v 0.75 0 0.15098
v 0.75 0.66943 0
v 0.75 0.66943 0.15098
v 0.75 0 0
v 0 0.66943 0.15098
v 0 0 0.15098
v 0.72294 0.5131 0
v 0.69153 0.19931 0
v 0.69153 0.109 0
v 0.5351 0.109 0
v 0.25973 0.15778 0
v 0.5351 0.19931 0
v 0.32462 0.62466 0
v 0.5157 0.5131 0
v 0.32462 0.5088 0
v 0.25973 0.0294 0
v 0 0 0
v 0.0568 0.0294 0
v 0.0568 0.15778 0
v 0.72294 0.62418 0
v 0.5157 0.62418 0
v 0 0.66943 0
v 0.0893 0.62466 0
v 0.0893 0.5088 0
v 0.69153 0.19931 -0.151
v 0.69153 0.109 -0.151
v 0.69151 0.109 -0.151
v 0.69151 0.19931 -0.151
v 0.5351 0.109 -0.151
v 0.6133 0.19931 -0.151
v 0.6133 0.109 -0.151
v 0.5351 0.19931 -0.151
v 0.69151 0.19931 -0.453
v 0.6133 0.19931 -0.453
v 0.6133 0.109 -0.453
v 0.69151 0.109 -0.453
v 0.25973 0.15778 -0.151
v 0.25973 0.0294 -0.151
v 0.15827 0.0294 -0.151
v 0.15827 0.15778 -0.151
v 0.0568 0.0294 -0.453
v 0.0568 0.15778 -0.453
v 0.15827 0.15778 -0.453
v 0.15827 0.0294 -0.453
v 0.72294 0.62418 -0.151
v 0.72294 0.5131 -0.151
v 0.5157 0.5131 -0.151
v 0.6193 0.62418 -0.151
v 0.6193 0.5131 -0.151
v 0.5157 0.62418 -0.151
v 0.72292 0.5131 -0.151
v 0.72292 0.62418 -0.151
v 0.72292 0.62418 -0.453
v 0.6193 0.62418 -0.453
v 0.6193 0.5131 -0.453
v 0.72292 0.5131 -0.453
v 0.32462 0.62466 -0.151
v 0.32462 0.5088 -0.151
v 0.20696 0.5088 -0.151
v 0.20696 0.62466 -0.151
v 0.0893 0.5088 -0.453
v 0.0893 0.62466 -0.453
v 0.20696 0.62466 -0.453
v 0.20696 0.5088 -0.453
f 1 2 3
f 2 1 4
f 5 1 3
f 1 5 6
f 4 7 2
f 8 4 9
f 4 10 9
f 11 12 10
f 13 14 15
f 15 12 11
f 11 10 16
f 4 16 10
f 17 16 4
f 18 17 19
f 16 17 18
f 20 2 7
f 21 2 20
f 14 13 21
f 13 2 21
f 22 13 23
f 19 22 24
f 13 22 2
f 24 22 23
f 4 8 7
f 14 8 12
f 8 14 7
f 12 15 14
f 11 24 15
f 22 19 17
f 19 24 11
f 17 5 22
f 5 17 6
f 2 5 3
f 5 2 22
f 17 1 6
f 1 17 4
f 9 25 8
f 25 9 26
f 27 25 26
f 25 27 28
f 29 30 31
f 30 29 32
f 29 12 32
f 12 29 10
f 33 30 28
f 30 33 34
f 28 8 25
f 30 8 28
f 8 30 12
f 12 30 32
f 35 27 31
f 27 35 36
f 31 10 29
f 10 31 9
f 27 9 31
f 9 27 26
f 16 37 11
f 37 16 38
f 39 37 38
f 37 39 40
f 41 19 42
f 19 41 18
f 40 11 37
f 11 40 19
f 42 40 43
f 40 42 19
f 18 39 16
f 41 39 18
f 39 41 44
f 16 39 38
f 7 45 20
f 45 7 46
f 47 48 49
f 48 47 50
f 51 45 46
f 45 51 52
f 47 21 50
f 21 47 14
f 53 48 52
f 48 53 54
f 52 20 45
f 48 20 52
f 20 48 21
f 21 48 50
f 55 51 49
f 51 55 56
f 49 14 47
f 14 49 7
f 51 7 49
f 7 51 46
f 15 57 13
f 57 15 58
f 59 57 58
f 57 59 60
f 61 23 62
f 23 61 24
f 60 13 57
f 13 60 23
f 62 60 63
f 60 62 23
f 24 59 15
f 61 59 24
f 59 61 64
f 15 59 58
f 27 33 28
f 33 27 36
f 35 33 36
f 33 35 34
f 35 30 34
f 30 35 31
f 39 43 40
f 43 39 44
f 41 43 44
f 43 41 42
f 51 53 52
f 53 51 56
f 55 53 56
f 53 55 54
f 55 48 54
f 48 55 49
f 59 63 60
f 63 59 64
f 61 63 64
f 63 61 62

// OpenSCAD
// Base dimensions
length = 0.75;
width = 0.669426;
height = 0.150979;

// Pad depths
pad_depth = 0.151;
continuation_depth = 0.302;

// Pad 1 (shallow)
pad1_w = 0.156427;
pad1_d = 0.090313;
pad1_left = 0.5351;
pad1_right = 0.0585;
pad1_front = 0.109;
pad1_back = 0.4701;

// Pad 2 (shallow)
pad2_w = 0.202932;
pad2_d = 0.128382;
pad2_left = 0.0568;
pad2_right = 0.4903;
pad2_front = 0.0294;
pad2_back = 0.5116;

// Pad 3 (shallow)
pad3_w = 0.207237;
pad3_d = 0.111076;
pad3_left = 0.5157;
pad3_right = 0.0271;
pad3_front = 0.5131;
pad3_back = 0.0452;

// Pad 4 (shallow)
pad4_w = 0.235324;
pad4_d = 0.115862;
pad4_left = 0.0893;
pad4_right = 0.4254;
pad4_front = 0.5088;
pad4_back = 0.0447;

// Continuation dimensions and offsets (sharing edges with shallow pads)
cont1_w = 0.078214;
cont1_d = 0.090313;
cont1_left = 0.6133;
cont1_right = 0.0585;
cont1_front = 0.109;
cont1_back = 0.4701;

cont2_w = 0.101466;
cont2_d = 0.128382;
cont2_left = 0.0568;
cont2_right = 0.5917;
cont2_front = 0.0294;
cont2_back = 0.5116;

cont3_w = 0.103619;
cont3_d = 0.111076;
cont3_left = 0.6193;
cont3_right = 0.0271;
cont3_front = 0.5131;
cont3_back = 0.0452;

cont4_w = 0.117662;
cont4_d = 0.115862;
cont4_left = 0.0893;
cont4_right = 0.543;
cont4_front = 0.5088;
cont4_back = 0.0447;

// Main union of all components
union() {
    // Base solid
    cube([length, width, height]);

    // Pad 1 (shallow)
    translate([pad1_left, pad1_front, -pad_depth])
        cube([pad1_w, pad1_d, pad_depth]);

    // Pad 2 (shallow)
    translate([pad2_left, pad2_front, -pad_depth])
        cube([pad2_w, pad2_d, pad_depth]);

    // Pad 3 (shallow)
    translate([pad3_left, pad3_front, -pad_depth])
        cube([pad3_w, pad3_d, pad_depth]);

    // Pad 4 (shallow)
    translate([pad4_left, pad4_front, -pad_depth])
        cube([pad4_w, pad4_d, pad_depth]);

    // Continuation 1 (deep)
    translate([cont1_left, cont1_front, -(pad_depth + continuation_depth)])
        cube([cont1_w, cont1_d, continuation_depth]);

    // Continuation 2 (deep)
    translate([cont2_left, cont2_front, -(pad_depth + continuation_depth)])
        cube([cont2_w, cont2_d, continuation_depth]);

    // Continuation 3 (deep)
    translate([cont3_left, cont3_front, -(pad_depth + continuation_depth)])
        cube([cont3_w, cont3_d, continuation_depth]);

    // Continuation 4 (deep)
    translate([cont4_left, cont4_front, -(pad_depth + continuation_depth)])
        cube([cont4_w, cont4_d, continuation_depth]);
}
